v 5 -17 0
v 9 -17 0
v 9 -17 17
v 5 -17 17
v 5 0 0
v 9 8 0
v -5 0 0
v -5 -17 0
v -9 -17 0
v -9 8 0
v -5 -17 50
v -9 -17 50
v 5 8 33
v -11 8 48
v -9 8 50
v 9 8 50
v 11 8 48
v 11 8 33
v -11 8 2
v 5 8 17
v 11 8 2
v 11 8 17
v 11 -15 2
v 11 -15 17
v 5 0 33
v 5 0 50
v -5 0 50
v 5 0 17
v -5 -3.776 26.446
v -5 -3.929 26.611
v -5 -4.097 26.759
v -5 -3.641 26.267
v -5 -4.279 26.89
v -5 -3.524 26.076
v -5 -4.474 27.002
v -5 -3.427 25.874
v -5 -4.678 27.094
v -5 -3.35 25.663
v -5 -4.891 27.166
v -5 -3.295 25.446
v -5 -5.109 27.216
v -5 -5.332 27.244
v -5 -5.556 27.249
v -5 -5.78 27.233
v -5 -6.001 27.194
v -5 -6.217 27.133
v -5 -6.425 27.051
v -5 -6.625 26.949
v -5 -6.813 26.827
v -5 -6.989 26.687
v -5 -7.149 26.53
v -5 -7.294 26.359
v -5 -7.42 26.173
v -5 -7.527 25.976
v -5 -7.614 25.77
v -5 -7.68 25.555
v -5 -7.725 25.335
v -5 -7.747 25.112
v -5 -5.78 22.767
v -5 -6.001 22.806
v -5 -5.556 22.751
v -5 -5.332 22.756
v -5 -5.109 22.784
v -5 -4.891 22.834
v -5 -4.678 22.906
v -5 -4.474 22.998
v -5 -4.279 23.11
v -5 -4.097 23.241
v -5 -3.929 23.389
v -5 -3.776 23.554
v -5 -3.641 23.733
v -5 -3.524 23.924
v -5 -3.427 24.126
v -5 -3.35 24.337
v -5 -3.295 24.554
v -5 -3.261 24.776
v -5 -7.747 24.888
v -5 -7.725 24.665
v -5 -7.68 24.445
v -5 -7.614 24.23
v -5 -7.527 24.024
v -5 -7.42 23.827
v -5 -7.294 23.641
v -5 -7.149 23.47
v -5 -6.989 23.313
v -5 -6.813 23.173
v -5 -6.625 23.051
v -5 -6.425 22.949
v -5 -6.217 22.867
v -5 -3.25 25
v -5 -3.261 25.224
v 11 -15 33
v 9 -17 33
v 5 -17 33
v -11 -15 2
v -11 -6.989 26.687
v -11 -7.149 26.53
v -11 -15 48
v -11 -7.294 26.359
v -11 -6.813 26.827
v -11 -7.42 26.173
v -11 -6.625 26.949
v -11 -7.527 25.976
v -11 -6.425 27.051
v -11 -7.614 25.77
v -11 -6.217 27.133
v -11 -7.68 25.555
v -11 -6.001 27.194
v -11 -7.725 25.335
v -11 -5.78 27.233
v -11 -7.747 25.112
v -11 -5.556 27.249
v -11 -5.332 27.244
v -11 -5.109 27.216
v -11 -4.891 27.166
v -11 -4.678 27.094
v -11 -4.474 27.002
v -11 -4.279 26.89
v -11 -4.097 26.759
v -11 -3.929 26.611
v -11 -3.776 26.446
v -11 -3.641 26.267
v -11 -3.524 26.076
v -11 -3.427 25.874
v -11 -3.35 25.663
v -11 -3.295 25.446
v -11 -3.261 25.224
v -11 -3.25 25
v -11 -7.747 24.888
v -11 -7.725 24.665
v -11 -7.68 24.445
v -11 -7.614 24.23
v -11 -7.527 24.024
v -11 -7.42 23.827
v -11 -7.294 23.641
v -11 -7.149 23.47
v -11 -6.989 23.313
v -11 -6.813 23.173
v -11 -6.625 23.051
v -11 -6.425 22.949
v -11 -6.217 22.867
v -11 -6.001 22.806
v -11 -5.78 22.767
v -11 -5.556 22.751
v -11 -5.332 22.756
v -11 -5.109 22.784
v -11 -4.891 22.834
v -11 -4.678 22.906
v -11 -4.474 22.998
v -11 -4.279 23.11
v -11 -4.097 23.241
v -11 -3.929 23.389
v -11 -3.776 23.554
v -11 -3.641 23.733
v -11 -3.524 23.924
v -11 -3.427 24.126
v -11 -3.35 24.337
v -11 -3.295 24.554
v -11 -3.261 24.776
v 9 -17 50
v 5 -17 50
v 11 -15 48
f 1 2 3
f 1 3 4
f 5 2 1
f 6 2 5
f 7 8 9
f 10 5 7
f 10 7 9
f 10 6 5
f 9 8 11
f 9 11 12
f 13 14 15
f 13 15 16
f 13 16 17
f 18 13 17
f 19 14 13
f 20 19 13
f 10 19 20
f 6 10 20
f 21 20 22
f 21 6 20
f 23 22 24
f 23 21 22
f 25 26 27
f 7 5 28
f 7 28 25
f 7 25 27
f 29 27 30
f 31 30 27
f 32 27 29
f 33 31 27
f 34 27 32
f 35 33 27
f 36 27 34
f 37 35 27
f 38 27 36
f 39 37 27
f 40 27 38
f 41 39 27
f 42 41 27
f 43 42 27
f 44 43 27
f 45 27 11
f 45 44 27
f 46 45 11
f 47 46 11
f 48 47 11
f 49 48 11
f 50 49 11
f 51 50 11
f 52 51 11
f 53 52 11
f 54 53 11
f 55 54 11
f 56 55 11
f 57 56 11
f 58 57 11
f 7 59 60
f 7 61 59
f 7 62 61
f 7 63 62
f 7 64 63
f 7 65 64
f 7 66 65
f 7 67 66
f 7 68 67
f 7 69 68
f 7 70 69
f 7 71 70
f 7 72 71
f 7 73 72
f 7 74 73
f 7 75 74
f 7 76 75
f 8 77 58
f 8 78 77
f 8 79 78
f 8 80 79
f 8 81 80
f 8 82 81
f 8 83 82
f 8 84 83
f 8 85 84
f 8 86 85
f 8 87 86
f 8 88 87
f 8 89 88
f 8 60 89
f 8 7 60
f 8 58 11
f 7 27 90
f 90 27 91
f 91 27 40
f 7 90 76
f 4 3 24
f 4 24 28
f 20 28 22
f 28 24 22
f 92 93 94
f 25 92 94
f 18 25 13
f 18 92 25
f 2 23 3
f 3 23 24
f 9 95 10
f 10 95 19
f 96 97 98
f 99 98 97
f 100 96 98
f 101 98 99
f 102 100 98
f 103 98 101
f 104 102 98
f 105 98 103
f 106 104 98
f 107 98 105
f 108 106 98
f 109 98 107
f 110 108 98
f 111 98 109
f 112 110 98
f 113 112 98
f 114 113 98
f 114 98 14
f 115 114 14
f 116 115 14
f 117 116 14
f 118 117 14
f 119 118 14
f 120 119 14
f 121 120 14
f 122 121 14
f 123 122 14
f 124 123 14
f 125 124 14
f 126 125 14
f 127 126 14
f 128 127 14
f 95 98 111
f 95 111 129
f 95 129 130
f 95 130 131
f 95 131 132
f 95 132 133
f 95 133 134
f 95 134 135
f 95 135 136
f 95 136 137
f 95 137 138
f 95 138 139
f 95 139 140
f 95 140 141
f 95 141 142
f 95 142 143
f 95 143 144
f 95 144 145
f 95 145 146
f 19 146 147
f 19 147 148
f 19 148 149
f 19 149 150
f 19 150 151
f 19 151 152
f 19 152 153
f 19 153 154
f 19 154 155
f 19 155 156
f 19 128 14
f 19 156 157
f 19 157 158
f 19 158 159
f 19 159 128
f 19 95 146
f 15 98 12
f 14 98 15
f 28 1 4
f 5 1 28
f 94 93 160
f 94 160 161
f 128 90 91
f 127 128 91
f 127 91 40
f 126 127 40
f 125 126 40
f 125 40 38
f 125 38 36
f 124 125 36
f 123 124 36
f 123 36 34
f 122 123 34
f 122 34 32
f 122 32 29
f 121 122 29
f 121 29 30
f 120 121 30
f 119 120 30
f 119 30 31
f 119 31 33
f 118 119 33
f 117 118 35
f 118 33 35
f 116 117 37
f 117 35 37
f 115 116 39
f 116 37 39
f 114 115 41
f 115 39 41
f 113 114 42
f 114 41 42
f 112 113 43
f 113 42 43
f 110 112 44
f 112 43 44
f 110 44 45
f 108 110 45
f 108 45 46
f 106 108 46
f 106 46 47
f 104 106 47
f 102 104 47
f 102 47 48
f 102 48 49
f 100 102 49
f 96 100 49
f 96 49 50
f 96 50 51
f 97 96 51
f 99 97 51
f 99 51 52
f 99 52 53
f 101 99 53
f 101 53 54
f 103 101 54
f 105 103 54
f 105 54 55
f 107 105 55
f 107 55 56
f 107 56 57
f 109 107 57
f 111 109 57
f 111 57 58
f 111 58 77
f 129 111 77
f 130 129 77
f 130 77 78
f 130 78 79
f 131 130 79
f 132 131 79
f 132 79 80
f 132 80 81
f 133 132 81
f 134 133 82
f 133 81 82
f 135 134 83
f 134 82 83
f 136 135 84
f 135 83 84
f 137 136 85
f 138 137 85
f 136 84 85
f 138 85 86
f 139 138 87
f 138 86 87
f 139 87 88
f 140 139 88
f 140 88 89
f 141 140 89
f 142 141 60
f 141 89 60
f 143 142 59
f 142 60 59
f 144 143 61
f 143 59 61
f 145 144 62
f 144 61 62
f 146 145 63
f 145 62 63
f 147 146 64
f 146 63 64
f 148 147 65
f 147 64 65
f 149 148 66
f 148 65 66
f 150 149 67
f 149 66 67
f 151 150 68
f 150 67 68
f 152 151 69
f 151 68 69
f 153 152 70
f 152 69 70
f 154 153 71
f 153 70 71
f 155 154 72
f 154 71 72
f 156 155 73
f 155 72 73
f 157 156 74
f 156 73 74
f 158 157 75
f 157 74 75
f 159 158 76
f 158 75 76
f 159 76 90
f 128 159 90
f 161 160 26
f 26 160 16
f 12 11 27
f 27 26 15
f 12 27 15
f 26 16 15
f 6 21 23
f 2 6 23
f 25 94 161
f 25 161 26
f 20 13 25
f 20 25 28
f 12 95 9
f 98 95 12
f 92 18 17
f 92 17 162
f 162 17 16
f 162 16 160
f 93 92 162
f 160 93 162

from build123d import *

# Parameters (mm, degrees)
ESTRUSIONE_ESTRUSIONE1_DEPTH = 50
SCHIZZO2_W                   = 16
SCHIZZO2_H                   = 25
TAGLIO_ESTRUSIONE1_DEPTH     = 6
SCHIZZO3_R                   = 2.25
TAGLIO_ESTRUSIONE2_DEPTH     = 10
SMUSSO1_SIZE                 = 2


with BuildPart() as part:
    # Schizzo1 → Estrusione-Estrusione1 (new body)
    with BuildSketch(Plane.XY):
        Polygon((5, 0), (-5, 0), (-5, -17), (-11, -17), (-11, 8), (11, 8), (11, -17), (5, -17), align=None)
    extrude(amount=ESTRUSIONE_ESTRUSIONE1_DEPTH)

    # Schizzo2 → Taglio-Estrusione1 (cut)
    with BuildSketch(Plane(origin=(11, 0, 0), x_dir=(0, 0, -1), z_dir=(1, 0, 0))):
        with Locations((-25, -4.5)):
            Rectangle(SCHIZZO2_W, SCHIZZO2_H)
    extrude(amount=-TAGLIO_ESTRUSIONE1_DEPTH, mode=Mode.SUBTRACT)

    # Schizzo3 → Taglio-Estrusione2 (cut)
    with BuildSketch(Plane(origin=(-5, 0, 0), x_dir=(0, 0, -1), z_dir=(1, 0, 0))):
        with Locations(Location((-25, -5.5, 0), (0, 0, 90))):
            Circle(SCHIZZO3_R)
    extrude(amount=-TAGLIO_ESTRUSIONE2_DEPTH, mode=Mode.SUBTRACT)

    # Smusso1
    smusso1_edges = [part.edges().sort_by_distance(p)[0] for p in [
        (11, -4.5, 0),
        (11, -4.5, 50),
        (-11, -17, 25),
        (11, -17, 41.5),
        (-11, -4.5, 50),
        (11, -17, 8.5),
        (-11, -4.5, 0),
    ]]
    chamfer(smusso1_edges, length=SMUSSO1_SIZE)


solid = part.part
